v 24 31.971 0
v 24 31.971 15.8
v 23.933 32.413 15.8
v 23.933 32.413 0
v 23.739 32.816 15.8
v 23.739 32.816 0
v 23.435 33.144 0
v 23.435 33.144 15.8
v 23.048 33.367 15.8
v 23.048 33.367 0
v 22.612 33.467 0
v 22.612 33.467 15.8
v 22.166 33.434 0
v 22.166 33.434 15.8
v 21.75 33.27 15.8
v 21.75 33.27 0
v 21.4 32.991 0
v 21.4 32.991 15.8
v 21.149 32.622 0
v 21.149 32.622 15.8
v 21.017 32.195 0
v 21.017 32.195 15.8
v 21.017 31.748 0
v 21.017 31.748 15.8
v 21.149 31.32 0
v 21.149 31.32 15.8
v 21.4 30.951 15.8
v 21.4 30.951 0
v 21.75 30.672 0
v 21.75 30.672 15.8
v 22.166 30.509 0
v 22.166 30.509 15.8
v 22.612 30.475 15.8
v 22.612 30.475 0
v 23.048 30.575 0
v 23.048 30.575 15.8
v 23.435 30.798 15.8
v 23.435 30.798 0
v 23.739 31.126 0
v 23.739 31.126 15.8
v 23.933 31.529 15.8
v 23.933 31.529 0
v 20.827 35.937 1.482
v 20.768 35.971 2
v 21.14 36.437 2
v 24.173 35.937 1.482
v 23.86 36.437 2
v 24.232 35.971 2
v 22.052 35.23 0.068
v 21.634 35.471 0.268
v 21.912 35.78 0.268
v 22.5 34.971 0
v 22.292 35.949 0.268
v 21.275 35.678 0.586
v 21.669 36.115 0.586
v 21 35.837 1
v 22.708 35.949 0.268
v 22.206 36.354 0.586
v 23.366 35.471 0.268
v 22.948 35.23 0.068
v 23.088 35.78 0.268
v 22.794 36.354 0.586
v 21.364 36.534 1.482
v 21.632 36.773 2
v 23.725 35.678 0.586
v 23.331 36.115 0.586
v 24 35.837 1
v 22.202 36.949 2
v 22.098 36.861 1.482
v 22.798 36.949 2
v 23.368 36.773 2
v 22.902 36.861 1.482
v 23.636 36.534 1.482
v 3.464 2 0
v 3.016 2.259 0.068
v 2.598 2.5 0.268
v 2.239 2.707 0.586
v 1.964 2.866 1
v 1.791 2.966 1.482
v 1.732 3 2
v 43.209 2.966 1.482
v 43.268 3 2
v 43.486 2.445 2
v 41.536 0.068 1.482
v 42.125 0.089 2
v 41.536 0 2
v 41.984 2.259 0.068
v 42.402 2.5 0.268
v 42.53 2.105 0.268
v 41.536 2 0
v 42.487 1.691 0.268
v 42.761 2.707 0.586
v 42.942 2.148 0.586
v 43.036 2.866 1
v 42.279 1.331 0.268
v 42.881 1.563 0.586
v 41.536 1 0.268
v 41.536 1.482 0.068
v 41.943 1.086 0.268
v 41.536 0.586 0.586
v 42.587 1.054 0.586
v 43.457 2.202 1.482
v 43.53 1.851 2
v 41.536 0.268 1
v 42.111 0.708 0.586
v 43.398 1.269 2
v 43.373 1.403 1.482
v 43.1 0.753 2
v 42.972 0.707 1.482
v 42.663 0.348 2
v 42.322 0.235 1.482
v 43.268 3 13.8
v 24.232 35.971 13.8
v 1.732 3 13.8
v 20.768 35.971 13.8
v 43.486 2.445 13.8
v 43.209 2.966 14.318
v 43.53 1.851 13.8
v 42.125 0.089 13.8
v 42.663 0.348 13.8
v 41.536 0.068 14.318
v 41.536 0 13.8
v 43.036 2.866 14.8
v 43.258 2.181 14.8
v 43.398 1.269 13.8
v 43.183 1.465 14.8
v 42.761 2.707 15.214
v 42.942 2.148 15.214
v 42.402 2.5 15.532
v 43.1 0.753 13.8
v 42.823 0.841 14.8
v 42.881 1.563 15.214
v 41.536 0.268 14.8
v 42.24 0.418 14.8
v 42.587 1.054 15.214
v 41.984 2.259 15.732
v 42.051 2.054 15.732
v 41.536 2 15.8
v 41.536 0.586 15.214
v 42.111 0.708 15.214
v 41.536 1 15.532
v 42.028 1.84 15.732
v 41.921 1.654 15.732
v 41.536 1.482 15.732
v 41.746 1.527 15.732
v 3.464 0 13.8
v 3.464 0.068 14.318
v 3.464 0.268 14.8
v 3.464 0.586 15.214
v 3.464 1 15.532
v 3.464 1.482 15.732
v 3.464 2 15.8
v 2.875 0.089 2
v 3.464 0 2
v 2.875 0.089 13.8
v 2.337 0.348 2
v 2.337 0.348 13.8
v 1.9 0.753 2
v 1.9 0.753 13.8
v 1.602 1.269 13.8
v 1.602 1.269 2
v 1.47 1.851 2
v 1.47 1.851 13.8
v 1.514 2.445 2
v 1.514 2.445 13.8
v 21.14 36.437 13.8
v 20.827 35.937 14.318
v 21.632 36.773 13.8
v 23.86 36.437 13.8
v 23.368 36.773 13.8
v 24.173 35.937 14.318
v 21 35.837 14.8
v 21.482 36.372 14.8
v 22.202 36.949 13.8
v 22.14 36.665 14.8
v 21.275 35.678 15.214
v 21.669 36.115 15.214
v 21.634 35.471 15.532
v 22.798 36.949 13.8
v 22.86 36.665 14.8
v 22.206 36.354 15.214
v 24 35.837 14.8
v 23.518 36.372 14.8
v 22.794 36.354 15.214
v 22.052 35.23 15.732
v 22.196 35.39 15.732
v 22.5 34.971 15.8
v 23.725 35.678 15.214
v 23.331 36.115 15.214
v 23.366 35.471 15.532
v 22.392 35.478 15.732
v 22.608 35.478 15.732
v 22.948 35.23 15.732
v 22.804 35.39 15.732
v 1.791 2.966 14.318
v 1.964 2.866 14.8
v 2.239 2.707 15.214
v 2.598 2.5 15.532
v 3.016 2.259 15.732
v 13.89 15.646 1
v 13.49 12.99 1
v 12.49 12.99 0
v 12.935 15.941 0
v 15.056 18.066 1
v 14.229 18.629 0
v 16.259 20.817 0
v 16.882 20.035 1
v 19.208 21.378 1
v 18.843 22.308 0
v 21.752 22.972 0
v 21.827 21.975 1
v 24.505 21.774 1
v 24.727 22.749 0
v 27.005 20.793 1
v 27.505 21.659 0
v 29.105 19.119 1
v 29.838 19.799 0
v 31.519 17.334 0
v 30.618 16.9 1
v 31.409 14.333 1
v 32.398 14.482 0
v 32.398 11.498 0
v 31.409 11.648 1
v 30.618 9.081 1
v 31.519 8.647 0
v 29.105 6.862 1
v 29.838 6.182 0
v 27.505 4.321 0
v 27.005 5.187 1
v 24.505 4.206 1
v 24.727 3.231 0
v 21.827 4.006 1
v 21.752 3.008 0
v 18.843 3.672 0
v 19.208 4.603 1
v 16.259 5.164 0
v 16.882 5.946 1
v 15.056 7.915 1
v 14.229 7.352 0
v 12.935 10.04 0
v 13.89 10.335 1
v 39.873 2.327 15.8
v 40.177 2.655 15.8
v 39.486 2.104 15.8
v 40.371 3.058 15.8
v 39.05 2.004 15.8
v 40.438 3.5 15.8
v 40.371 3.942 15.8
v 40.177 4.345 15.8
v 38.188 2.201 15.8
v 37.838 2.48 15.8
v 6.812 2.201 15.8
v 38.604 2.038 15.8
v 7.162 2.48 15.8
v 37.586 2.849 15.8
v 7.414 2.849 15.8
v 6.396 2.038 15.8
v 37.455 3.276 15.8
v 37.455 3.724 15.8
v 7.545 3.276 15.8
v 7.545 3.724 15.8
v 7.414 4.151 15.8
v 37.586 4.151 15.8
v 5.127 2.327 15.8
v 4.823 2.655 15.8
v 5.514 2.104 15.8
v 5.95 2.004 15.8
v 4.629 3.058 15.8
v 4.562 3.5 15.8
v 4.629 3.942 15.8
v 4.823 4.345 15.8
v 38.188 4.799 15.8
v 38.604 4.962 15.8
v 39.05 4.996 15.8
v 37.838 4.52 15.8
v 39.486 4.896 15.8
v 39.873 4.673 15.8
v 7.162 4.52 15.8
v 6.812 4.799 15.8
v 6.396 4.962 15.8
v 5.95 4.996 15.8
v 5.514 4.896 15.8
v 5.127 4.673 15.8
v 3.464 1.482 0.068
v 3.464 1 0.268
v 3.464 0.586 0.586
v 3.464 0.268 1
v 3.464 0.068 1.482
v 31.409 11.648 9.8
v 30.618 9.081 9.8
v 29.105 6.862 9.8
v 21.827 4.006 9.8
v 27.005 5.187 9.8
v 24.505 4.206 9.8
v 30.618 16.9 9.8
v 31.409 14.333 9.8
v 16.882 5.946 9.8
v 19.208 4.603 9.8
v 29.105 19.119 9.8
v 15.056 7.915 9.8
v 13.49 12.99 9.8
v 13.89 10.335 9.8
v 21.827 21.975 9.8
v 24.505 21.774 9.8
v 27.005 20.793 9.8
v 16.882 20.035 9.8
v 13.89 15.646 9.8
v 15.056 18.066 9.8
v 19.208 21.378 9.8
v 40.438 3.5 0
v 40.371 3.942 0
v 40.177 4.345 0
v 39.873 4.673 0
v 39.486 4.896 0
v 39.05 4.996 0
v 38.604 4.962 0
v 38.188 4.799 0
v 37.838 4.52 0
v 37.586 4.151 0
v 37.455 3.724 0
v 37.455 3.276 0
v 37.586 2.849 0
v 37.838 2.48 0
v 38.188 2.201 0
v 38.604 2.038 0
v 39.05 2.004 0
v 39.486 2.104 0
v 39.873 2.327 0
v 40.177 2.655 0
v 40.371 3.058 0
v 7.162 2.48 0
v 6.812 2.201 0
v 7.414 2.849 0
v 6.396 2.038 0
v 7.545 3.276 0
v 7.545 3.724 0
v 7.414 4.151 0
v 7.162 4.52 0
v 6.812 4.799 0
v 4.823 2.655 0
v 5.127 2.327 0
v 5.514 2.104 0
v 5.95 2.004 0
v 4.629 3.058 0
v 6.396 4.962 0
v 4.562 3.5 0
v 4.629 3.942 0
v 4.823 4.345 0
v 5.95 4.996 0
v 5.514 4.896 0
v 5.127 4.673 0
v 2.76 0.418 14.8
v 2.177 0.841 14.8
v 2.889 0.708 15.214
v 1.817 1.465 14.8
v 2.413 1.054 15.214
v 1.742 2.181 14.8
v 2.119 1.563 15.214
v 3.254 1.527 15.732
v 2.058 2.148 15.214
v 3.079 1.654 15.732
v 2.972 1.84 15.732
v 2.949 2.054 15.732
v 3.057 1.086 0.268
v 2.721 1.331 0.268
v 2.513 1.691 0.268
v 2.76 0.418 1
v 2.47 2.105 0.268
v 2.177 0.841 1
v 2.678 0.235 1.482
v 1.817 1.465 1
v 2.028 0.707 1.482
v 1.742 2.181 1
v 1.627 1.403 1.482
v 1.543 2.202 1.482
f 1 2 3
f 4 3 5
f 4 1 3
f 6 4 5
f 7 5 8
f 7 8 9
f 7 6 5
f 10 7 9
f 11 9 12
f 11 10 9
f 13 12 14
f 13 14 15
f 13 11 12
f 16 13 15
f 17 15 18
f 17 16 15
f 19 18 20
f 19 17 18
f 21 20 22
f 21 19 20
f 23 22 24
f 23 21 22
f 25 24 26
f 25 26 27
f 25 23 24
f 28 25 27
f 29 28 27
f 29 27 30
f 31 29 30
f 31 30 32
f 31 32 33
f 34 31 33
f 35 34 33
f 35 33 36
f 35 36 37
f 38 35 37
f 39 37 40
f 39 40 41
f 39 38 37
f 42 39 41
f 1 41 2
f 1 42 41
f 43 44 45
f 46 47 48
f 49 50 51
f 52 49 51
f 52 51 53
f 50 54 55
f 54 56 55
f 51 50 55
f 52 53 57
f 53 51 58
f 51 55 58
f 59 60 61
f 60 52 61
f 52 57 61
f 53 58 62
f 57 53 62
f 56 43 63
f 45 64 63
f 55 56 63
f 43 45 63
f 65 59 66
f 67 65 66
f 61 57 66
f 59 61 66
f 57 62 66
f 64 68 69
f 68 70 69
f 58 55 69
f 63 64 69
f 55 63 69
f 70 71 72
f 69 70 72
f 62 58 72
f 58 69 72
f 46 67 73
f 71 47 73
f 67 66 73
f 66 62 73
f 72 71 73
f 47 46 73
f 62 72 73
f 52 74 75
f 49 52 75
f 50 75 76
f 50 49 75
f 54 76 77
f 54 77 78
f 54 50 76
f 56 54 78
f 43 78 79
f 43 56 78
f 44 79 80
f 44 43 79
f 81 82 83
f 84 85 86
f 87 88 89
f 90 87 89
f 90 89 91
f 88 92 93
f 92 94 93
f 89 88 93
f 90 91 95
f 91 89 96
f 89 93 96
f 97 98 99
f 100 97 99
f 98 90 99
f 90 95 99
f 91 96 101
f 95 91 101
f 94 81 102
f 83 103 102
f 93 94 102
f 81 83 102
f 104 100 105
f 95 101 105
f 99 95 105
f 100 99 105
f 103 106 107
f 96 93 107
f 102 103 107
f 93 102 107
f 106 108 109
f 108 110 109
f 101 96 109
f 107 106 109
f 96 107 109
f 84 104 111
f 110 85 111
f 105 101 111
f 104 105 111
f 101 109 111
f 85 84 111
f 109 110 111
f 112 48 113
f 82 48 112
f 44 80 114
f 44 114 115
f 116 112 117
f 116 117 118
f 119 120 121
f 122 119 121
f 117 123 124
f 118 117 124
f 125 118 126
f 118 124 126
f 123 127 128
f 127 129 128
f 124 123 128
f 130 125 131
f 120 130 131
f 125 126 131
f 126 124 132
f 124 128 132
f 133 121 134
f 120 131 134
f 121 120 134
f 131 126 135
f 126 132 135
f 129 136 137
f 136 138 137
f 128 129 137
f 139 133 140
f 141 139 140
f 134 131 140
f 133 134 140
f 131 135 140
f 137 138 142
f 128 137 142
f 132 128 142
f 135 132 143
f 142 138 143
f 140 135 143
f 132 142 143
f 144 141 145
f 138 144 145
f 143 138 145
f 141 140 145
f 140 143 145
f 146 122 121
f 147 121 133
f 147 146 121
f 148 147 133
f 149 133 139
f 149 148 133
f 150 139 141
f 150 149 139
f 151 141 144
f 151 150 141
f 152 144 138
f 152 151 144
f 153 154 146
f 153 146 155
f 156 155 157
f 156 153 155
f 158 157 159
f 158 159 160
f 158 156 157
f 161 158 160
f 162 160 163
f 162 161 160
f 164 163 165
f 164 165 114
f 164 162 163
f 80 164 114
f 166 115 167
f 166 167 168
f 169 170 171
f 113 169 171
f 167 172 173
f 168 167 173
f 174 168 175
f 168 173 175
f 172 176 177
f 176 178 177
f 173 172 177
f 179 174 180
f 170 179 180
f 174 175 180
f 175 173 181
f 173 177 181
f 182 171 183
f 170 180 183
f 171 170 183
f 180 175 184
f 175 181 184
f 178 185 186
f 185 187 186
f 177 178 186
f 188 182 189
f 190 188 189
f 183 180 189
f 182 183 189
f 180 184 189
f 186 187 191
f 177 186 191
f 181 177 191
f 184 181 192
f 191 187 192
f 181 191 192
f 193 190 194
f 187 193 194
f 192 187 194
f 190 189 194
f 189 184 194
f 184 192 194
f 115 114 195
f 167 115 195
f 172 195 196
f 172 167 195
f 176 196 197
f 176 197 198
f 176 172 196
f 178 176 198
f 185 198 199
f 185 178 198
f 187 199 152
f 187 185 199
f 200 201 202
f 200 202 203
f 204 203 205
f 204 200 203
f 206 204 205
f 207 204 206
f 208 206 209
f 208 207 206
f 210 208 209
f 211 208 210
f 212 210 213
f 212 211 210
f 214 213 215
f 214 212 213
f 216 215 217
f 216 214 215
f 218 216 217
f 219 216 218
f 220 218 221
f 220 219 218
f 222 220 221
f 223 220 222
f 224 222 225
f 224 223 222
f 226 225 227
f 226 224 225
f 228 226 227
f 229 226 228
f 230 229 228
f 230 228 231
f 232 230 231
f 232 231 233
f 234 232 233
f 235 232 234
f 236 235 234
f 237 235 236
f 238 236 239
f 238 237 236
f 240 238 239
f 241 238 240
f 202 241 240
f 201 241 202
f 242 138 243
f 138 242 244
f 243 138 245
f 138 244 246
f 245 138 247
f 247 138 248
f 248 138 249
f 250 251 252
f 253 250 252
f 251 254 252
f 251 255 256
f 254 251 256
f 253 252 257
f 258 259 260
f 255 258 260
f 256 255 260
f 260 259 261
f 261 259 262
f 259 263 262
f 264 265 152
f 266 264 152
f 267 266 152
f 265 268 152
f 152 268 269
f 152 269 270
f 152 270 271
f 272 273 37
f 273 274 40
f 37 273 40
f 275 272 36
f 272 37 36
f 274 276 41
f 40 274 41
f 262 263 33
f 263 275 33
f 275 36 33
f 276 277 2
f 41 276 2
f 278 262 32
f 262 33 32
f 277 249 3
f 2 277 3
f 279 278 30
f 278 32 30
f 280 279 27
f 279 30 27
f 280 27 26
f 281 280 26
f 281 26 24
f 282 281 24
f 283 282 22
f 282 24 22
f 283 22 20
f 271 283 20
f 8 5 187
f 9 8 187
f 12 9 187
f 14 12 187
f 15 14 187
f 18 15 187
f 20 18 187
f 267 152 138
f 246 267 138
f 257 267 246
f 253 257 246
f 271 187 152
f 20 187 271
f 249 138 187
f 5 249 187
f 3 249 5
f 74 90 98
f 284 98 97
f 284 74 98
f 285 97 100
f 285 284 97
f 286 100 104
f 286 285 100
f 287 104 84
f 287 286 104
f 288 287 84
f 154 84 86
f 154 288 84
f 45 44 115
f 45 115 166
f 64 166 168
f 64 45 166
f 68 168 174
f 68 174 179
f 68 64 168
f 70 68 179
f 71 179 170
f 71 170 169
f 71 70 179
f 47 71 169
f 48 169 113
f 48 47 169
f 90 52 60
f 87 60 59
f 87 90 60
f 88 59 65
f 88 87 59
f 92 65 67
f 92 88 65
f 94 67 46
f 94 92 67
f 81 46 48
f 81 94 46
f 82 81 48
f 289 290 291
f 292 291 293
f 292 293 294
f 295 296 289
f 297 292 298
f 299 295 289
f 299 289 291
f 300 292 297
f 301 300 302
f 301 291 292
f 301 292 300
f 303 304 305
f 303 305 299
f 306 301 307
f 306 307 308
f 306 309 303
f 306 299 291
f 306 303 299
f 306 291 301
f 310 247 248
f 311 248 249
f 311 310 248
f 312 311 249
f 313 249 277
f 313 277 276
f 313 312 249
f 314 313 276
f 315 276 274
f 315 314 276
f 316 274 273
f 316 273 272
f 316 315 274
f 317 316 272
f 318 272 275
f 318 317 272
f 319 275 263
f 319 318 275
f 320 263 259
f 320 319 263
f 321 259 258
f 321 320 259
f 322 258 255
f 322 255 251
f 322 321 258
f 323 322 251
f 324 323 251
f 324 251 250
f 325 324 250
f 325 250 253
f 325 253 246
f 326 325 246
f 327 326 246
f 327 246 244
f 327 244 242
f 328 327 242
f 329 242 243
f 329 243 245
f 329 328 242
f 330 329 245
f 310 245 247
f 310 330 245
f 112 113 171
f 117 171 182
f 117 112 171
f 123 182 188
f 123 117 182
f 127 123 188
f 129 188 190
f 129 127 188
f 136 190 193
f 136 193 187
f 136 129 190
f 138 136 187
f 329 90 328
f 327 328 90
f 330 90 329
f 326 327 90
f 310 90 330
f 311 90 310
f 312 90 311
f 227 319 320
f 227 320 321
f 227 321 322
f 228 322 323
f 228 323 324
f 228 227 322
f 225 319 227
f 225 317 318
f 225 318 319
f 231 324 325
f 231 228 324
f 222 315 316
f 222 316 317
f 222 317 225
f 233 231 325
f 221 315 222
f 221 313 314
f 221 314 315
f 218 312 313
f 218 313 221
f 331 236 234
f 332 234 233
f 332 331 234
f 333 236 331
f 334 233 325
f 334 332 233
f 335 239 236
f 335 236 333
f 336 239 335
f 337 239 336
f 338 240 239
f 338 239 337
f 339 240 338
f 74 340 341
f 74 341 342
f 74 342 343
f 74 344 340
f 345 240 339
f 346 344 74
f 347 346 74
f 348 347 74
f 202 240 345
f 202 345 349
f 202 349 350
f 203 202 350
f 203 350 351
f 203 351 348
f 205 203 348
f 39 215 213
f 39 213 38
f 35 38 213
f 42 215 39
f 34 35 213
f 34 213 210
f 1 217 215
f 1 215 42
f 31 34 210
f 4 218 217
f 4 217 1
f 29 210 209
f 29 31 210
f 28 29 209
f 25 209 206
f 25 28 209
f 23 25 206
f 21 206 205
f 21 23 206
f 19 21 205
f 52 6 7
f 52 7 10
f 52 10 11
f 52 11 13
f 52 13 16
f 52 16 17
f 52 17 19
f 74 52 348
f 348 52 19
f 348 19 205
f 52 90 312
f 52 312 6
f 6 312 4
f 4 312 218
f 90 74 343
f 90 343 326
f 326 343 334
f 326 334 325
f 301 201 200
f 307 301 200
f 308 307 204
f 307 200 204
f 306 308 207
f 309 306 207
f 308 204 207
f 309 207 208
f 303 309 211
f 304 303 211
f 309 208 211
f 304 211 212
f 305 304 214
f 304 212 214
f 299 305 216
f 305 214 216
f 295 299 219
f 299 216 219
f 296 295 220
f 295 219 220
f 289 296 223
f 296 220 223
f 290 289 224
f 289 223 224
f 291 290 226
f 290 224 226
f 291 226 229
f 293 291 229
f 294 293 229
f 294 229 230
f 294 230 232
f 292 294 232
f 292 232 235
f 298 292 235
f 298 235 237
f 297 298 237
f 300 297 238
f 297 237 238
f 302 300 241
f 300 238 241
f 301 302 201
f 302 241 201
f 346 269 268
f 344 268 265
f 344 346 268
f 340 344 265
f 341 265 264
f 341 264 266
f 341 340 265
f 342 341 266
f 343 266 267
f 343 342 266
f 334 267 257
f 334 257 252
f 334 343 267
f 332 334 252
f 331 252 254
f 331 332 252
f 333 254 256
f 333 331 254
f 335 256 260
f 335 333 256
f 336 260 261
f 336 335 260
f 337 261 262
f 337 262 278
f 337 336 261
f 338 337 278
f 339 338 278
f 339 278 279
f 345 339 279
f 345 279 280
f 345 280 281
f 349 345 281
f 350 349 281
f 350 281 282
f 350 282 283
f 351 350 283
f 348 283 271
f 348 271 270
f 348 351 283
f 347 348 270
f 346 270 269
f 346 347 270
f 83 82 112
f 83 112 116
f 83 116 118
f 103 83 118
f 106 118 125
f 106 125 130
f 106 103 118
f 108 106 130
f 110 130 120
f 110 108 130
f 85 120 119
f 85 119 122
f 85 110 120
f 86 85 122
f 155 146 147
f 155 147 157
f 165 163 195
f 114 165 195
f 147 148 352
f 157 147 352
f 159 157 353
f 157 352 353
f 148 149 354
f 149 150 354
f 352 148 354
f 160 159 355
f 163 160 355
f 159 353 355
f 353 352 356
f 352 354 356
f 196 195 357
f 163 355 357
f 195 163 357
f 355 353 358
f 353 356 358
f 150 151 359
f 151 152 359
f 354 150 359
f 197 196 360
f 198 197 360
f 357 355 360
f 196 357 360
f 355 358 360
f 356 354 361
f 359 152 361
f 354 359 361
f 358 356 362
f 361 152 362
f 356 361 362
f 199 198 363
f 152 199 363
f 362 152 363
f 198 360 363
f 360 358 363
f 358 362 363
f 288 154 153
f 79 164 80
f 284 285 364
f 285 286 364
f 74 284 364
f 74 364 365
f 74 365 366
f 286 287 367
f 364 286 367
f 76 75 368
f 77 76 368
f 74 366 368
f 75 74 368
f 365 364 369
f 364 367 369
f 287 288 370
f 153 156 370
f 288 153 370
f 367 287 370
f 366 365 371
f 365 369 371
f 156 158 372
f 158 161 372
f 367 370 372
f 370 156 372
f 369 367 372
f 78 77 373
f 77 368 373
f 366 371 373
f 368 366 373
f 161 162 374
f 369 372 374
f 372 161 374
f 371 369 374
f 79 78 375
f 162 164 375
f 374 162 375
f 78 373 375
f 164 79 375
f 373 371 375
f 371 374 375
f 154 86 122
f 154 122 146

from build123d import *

# Parameters (mm, degrees)
ESQUISSE1_R             = 1.5
BOSS_EXTRU_1_DEPTH      = 15.8
ESQUISSE2_R             = 9.01
ENL_V_MAT_EXTRU_1_DEPTH = 9.8
CHANFREIN1_SIZE         = 1
CONG_2_R                = 2


with BuildPart() as part:
    # Esquisse1 → Boss.-Extru.1 (new body)
    with BuildSketch(Plane.XY):
        with BuildLine():
            Line((1.732050808, 3), (20.767949192, 35.97114317))
            ThreePointArc((20.767949192, 35.97114317), (22.5, 36.97114317), (24.232050808, 35.97114317))
            Line((24.232050808, 35.97114317), (43.267949192, 3))
            ThreePointArc((43.267949192, 3), (43.267949192, 1), (41.535898385, 0))
            Line((41.535898385, 0), (3.464101615, 0))
            ThreePointArc((3.464101615, 0), (1.732050808, 1), (1.732050808, 3))
        make_face()
        with Locations((22.5, 31.97114317)):
            Circle(ESQUISSE1_R, mode=Mode.SUBTRACT)
        with Locations((38.937822174, 3.5)):
            Circle(ESQUISSE1_R, mode=Mode.SUBTRACT)
        with Locations(Location((6.062177826, 3.5, 0), (0, 0, 180))):
            Circle(ESQUISSE1_R, mode=Mode.SUBTRACT)
    extrude(amount=BOSS_EXTRU_1_DEPTH)

    # Esquisse2 → Enlèv. mat.-Extru.1 (cut)
    with BuildSketch(Plane(origin=(0, 0, 0), x_dir=(-1, 0, 0), z_dir=(0, 0, -1))):
        with Locations((-22.5, 12.990381057)):
            Circle(ESQUISSE2_R)
    extrude(amount=-ENL_V_MAT_EXTRU_1_DEPTH, mode=Mode.SUBTRACT)

    # Chanfrein1
    chanfrein1_edges = [part.edges().sort_by_distance(p)[0] for p in [
        (31.51, 12.990381057, 0),
    ]]
    chamfer(chanfrein1_edges, length=CHANFREIN1_SIZE)

    # Congé2
    cong_2_edges = [part.edges().sort_by_distance(p)[0] for p in [
        (43.267949192, 1, 15.8),
        (22.5, 0, 15.8),
        (1.732050808, 1, 15.8),
        (11.25, 19.485571585, 15.8),
        (22.5, 36.97114317, 15.8),
        (11.25, 19.485571585, 0),
        (1.732050808, 1, 0),
        (22.5, 0, 0),
        (43.267949192, 1, 0),
        (33.75, 19.485571585, 0),
        (22.5, 36.97114317, 0),
        (33.75, 19.485571585, 15.8),
    ]]
    fillet(cong_2_edges, radius=CONG_2_R - 0.0001)  # a hair under: the kernel refuses the full size


solid = part.part
